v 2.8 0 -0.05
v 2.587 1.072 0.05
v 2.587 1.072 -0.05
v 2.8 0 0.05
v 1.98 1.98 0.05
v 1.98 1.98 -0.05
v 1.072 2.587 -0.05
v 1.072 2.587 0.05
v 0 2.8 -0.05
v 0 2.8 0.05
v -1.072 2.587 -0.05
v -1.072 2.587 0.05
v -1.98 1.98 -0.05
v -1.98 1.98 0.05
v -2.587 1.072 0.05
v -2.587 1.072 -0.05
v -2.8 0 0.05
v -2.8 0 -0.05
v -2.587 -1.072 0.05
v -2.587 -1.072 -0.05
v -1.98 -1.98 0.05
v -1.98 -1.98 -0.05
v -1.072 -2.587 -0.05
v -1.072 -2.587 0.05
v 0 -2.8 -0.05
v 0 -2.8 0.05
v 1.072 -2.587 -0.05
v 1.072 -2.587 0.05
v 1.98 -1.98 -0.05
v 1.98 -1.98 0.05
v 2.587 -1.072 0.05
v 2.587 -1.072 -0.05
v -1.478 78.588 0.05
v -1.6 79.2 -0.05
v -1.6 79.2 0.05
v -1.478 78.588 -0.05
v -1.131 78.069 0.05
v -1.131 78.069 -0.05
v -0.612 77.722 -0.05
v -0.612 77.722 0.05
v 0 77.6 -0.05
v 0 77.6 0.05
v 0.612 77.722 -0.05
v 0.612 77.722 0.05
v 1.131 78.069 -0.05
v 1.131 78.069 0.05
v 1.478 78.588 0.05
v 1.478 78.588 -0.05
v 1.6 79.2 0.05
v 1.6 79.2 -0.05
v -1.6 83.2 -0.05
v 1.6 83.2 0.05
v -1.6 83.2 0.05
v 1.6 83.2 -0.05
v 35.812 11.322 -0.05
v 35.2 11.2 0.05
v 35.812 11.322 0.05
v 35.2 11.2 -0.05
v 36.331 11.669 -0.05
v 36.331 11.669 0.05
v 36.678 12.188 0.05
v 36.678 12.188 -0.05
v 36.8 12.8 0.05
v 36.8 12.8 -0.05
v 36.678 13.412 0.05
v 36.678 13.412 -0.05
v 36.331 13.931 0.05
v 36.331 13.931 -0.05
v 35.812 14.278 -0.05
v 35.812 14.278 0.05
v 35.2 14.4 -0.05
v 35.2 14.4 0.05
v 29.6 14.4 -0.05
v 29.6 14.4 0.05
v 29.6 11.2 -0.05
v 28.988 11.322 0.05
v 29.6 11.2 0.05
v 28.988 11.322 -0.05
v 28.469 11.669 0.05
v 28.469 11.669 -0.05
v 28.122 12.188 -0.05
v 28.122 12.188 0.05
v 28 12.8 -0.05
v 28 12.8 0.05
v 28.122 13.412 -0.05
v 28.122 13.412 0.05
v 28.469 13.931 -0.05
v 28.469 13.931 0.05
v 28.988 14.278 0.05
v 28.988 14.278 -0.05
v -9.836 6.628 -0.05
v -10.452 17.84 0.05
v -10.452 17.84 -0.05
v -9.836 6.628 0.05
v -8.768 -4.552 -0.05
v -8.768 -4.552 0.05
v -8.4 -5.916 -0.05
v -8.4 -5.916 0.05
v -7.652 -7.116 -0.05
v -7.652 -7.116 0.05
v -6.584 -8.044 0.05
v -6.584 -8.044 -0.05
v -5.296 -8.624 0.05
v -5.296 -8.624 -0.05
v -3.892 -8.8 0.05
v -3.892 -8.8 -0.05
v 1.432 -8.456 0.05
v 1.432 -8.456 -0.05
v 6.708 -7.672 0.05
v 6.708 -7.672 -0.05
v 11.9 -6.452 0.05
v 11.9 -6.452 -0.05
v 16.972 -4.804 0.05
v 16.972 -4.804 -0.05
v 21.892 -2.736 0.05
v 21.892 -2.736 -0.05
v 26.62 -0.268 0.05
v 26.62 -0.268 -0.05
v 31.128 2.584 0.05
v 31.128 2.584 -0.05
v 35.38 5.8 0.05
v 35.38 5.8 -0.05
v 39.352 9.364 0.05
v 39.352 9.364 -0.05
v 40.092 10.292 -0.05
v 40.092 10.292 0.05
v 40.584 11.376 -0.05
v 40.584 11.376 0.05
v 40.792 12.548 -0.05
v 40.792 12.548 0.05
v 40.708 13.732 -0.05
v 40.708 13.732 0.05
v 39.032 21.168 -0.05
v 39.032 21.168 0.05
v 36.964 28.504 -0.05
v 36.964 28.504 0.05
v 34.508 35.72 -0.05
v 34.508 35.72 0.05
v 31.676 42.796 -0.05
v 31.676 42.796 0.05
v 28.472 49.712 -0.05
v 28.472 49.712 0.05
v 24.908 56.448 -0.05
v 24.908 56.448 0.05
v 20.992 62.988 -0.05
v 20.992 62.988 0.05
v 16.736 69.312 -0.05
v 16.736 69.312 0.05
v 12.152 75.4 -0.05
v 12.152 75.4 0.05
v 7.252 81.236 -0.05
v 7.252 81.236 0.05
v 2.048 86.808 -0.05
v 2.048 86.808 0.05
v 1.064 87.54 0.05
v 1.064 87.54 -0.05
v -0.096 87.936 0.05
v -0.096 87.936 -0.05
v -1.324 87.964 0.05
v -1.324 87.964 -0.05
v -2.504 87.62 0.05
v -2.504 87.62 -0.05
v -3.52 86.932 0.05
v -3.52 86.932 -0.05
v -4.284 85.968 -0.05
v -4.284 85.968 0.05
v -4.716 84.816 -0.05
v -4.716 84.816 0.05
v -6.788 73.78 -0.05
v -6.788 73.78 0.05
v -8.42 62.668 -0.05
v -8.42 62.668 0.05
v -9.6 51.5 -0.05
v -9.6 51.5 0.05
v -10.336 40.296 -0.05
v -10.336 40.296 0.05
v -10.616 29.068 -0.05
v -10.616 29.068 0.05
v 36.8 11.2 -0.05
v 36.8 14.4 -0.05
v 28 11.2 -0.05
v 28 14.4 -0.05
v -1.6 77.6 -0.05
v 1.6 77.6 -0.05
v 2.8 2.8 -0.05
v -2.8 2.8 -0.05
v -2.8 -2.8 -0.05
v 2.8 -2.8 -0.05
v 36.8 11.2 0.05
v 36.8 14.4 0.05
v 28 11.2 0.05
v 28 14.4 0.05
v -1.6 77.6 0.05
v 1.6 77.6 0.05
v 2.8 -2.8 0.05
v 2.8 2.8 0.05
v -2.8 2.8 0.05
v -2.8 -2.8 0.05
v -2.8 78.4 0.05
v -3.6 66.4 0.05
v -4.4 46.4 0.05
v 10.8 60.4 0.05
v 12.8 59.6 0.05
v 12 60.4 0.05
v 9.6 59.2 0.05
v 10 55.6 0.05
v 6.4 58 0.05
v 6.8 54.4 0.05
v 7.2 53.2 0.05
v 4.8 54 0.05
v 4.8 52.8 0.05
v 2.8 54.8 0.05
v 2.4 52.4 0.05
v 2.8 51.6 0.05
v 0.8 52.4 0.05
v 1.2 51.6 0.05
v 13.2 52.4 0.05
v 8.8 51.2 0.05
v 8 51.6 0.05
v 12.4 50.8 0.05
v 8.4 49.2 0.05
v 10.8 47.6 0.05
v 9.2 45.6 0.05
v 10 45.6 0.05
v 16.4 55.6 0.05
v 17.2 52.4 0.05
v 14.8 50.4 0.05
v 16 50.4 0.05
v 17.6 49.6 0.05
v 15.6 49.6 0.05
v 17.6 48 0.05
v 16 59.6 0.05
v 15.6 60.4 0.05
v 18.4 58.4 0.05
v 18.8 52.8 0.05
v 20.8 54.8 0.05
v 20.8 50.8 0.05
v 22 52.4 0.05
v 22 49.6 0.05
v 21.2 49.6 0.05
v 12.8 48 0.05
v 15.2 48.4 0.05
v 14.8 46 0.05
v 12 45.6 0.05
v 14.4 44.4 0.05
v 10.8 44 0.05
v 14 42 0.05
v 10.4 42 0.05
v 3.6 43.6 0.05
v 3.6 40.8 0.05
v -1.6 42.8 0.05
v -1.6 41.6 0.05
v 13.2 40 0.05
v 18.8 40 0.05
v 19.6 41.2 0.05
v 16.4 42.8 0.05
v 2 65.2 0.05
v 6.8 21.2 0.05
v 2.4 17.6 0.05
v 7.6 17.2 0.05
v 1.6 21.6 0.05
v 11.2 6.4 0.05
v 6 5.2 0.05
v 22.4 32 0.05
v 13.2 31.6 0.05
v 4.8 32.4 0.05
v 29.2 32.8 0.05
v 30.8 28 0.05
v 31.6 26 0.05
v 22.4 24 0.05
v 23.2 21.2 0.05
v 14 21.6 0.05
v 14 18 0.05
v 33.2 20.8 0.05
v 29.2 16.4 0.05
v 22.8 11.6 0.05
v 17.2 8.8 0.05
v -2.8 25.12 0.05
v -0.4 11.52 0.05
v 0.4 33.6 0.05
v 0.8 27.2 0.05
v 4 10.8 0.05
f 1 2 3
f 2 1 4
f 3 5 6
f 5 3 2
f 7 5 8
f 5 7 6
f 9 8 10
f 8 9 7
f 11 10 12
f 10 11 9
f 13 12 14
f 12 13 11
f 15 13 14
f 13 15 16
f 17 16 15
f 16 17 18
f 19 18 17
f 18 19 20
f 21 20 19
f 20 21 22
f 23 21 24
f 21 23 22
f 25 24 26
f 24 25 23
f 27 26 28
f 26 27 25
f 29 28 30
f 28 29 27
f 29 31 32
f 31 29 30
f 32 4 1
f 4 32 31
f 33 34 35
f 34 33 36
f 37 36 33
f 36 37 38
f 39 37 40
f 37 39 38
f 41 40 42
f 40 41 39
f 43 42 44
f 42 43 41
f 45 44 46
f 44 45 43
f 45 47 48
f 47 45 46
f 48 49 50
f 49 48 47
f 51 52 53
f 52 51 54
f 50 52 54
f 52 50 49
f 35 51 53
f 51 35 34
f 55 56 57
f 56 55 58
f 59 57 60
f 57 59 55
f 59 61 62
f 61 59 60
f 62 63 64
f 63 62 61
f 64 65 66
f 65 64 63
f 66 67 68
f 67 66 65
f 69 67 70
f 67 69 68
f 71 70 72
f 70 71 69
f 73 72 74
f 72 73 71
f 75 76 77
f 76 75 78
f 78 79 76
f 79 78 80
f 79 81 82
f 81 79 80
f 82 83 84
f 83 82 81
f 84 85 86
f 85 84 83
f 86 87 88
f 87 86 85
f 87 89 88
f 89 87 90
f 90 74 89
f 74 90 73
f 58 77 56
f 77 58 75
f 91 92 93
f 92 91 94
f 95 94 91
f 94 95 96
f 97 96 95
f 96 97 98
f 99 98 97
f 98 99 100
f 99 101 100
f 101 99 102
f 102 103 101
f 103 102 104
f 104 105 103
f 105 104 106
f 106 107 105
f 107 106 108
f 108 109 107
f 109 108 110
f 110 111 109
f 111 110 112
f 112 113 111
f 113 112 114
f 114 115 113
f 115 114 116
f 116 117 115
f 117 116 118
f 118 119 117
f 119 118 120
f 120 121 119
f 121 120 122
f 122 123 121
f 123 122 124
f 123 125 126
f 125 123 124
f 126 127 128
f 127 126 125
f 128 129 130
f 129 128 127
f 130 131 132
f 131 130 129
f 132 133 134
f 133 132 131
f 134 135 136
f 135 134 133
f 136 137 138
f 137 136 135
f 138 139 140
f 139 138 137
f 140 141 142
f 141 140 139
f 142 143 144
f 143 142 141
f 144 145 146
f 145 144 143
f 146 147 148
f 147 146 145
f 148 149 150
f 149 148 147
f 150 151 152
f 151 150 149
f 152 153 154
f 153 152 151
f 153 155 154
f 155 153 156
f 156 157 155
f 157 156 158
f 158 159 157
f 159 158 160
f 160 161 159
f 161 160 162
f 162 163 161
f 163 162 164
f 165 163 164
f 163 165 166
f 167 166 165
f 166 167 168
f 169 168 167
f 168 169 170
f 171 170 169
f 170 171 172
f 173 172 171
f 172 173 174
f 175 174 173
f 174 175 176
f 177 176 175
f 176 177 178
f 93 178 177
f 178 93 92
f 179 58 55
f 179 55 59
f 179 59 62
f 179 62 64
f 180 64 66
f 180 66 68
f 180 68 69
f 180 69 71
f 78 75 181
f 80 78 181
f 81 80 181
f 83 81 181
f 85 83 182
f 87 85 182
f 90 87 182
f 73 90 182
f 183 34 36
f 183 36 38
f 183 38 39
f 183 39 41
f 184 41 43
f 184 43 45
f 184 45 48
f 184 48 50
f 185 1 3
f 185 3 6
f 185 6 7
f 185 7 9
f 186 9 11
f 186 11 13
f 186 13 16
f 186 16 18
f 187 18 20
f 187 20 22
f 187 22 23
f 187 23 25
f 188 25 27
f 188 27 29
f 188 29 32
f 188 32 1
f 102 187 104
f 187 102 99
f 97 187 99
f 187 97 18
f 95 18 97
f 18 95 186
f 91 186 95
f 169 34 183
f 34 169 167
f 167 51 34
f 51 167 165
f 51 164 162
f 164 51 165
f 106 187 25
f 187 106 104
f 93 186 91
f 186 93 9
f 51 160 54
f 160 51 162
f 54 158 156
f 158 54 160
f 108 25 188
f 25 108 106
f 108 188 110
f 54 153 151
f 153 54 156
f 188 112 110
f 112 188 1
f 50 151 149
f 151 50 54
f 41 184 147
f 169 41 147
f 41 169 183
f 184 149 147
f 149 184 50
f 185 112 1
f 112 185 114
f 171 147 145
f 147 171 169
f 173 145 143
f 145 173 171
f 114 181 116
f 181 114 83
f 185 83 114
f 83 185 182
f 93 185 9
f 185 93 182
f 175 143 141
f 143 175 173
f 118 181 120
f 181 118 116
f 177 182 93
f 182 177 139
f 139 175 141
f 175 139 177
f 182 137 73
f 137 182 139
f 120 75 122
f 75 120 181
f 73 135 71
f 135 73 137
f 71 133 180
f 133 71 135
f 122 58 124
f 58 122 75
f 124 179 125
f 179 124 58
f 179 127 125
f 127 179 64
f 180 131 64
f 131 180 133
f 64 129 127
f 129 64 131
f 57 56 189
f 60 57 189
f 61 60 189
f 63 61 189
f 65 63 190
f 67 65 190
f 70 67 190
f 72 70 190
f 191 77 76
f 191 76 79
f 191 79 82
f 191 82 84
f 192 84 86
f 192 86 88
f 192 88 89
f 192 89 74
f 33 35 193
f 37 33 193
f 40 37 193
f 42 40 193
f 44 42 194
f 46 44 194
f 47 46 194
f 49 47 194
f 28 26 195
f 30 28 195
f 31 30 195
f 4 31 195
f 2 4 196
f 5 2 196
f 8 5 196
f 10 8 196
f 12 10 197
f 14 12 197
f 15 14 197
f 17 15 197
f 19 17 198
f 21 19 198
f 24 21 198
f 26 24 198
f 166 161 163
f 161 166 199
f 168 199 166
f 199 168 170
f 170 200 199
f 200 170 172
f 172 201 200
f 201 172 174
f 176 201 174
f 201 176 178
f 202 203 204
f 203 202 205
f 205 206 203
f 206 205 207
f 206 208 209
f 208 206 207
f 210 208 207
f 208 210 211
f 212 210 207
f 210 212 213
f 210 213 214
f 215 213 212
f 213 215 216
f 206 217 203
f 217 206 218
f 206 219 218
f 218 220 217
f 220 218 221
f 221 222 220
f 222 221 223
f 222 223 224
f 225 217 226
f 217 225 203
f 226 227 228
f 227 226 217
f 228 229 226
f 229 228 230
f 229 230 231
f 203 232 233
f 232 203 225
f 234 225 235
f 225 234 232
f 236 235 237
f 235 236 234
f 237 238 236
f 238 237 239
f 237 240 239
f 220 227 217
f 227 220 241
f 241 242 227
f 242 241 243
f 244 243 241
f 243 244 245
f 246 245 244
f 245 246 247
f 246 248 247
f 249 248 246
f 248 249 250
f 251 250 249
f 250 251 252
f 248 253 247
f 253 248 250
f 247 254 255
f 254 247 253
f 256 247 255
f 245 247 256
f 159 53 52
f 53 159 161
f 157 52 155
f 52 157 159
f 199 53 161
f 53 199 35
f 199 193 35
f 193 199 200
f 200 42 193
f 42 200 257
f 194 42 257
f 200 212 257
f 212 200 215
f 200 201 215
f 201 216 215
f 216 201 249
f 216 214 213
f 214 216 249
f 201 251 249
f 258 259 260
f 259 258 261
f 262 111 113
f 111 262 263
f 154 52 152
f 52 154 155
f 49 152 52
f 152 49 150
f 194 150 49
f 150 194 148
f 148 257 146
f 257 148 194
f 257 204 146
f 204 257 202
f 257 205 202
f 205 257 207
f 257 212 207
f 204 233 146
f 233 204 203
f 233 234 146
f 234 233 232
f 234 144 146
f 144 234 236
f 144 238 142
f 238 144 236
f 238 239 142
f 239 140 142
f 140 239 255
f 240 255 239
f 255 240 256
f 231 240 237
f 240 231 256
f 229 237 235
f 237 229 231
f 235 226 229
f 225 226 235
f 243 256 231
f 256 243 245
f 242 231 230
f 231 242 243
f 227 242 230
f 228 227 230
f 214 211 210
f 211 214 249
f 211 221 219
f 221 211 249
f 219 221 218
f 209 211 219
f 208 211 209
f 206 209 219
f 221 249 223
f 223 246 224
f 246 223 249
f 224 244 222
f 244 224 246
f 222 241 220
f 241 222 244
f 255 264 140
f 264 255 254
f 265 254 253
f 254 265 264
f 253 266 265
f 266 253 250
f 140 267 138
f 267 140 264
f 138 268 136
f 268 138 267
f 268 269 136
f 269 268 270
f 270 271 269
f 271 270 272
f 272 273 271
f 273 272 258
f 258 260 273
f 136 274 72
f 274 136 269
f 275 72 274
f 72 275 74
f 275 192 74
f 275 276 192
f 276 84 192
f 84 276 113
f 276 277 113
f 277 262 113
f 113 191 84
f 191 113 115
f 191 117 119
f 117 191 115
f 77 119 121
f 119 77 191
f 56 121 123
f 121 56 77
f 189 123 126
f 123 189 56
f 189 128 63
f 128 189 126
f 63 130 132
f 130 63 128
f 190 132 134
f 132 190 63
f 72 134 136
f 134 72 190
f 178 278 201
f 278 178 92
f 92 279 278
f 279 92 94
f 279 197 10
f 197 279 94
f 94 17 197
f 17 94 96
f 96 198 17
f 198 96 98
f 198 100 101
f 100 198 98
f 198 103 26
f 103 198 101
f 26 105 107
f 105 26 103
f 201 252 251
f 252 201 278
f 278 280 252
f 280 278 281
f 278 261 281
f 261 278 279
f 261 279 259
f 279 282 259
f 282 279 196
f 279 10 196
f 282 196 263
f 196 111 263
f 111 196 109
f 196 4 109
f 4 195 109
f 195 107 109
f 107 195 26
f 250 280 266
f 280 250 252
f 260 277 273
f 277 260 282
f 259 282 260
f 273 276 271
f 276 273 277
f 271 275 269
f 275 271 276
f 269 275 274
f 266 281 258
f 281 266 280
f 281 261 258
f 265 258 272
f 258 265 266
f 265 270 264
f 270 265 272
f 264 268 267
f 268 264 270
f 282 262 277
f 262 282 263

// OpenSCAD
use <../lib.scad>
use <../p/2-4ndis.scad>
use <../p/4-4ndis.scad>
use <s/u66s01.scad>
use <s/u66s02.scad>
function ldraw_lib__u66p03() = [
// 0 Sheet Plastic  6 x 12 Triangular with Palm Tree and Vertical Pink Gradient Stripes Pattern
// 0 Name: u66p03.dat
// 0 Author: Takeshi Takahashi [RainbowDolphin]
// 0 !LDRAW_ORG Part UPDATE 2024-04
// 0 !LICENSE Licensed under CC BY 4.0 : see CAreadme.txt
// 
// 0 BFC CERTIFY CCW
  [0,"BFC","CERTIFY"],
  [0,"BFC","CCW"],
// 
// 0 !CATEGORY Sheet Plastic
// 0 !KEYWORDS Bricklink x66px9, Paradisa, Rebrickable upn0306pr0008, Sail
// 0 !KEYWORDS Set 6401, Set 6410, Set 6411, Surfboard
// 
// 0 !HISTORY 2023-01-09 [tchang] Replace CLIP` by CLIP on line 149
// 0 !HISTORY 2024-05-28 [OrionP] Official Update 2024-04
// 
// 
// 1 16 0 0 0 1 0 0 0 1 0 0 0 1 s\u66s01.dat
  [1,16,0,0,0,1,0,0,0,1,0,0,0,1, ldraw_lib__s__u66s01()],
// 1 16 0 .125 0 1 0 0 0 -1 0 0 0 1 s\u66s02.dat
  [1,16,0,.125,0,1,0,0,0,-1,0,0,0,1, ldraw_lib__s__u66s02()],
// 
// 0 // Pattern
// 0 BFC NOCLIP
  [0,"BFC","NOCLIP"],
// 1 13 88 -.125 32 0 0 4 0 1 0 -4 0 0 2-4ndis.dat
  [1,13,88,-.125,32,0,0,4,0,1,0,-4,0,0, ldraw_lib__2_4ndis()],
// 1 13 74 -.125 32 0 0 -4 0 1 0 -4 0 0 2-4ndis.dat
  [1,13,74,-.125,32,0,0,-4,0,1,0,-4,0,0, ldraw_lib__2_4ndis()],
// 1 351 0 -.125 198 -4 0 0 0 1 0 0 0 -4 2-4ndis.dat
  [1,351,0,-.125,198,-4,0,0,0,1,0,0,0,-4, ldraw_lib__2_4ndis()],
// 1 5 0 -.125 0 0 0 7 0 1 0 -7 0 0 4-4ndis.dat
  [1,5,0,-.125,0,0,0,7,0,1,0,-7,0,0, ldraw_lib__4_4ndis()],
// 4 5 -7 -.125 196 -6.26 -.125 219.05 -8.8 -.125 217.33 -10.71 -.125 214.92
  [4,5,-7,-.125,196,-6.26,-.125,219.05,-8.8,-.125,217.33,-10.71,-.125,214.92],
// 4 5 -7 -.125 196 -10.71 -.125 214.92 -11.79 -.125 212.04 -16.97 -.125 184.45
  [4,5,-7,-.125,196,-10.71,-.125,214.92,-11.79,-.125,212.04,-16.97,-.125,184.45],
// 4 5 -9 -.125 166 -7 -.125 196 -16.97 -.125 184.45 -21.05 -.125 156.67
  [4,5,-9,-.125,166,-7,-.125,196,-16.97,-.125,184.45,-21.05,-.125,156.67],
// 4 5 -9 -.125 166 -21.05 -.125 156.67 -24 -.125 128.75 -11 -.125 116
  [4,5,-9,-.125,166,-21.05,-.125,156.67,-24,-.125,128.75,-11,-.125,116],
// 4 5 -11 -.125 116 -24 -.125 128.75 -25.84 -.125 100.74 -26.54 -.125 72.67
  [4,5,-11,-.125,116,-24,-.125,128.75,-25.84,-.125,100.74,-26.54,-.125,72.67],
// 4 2 32 -.125 149 30 -.125 151 27 -.125 151 24 -.125 148
  [4,2,32,-.125,149,30,-.125,151,27,-.125,151,24,-.125,148],
// 4 2 25 -.125 139 32 -.125 149 24 -.125 148 16 -.125 145
  [4,2,25,-.125,139,32,-.125,149,24,-.125,148,16,-.125,145],
// 4 2 25 -.125 139 16 -.125 145 17 -.125 136 18 -.125 133
  [4,2,25,-.125,139,16,-.125,145,17,-.125,136,18,-.125,133],
// 4 2 17 -.125 136 16 -.125 145 12 -.125 135 12 -.125 132
  [4,2,17,-.125,136,16,-.125,145,12,-.125,135,12,-.125,132],
// 4 2 12 -.125 135 16 -.125 145 7 -.125 137 6 -.125 131
  [4,2,12,-.125,135,16,-.125,145,7,-.125,137,6,-.125,131],
// 3 2 12 -.125 135 6 -.125 131 7 -.125 129
  [3,2,12,-.125,135,6,-.125,131,7,-.125,129],
// 4 2 6 -.125 131 7 -.125 137 2 -.125 131 3 -.125 129
  [4,2,6,-.125,131,7,-.125,137,2,-.125,131,3,-.125,129],
// 4 2 33 -.125 131 32 -.125 149 25 -.125 139 22 -.125 128
  [4,2,33,-.125,131,32,-.125,149,25,-.125,139,22,-.125,128],
// 3 2 25 -.125 139 20 -.125 129 22 -.125 128
  [3,2,25,-.125,139,20,-.125,129,22,-.125,128],
// 4 2 31 -.125 127 33 -.125 131 22 -.125 128 21 -.125 123
  [4,2,31,-.125,127,33,-.125,131,22,-.125,128,21,-.125,123],
// 4 2 27 -.125 119 31 -.125 127 21 -.125 123 23 -.125 114
  [4,2,27,-.125,119,31,-.125,127,21,-.125,123,23,-.125,114],
// 3 2 27 -.125 119 23 -.125 114 25 -.125 114
  [3,2,27,-.125,119,23,-.125,114,25,-.125,114],
// 4 2 41 -.125 139 32 -.125 149 33 -.125 131 43 -.125 131
  [4,2,41,-.125,139,32,-.125,149,33,-.125,131,43,-.125,131],
// 4 2 43 -.125 131 33 -.125 131 37 -.125 126 40 -.125 126
  [4,2,43,-.125,131,33,-.125,131,37,-.125,126,40,-.125,126],
// 4 2 44 -.125 124 43 -.125 131 40 -.125 126 39 -.125 124
  [4,2,44,-.125,124,43,-.125,131,40,-.125,126,39,-.125,124],
// 3 2 44 -.125 124 39 -.125 124 44 -.125 120
  [3,2,44,-.125,124,39,-.125,124,44,-.125,120],
// 4 2 32 -.125 149 41 -.125 139 40 -.125 149 39 -.125 151
  [4,2,32,-.125,149,41,-.125,139,40,-.125,149,39,-.125,151],
// 4 2 46 -.125 146 40 -.125 149 41 -.125 139 47 -.125 132
  [4,2,46,-.125,146,40,-.125,149,41,-.125,139,47,-.125,132],
// 4 2 52 -.125 137 46 -.125 146 47 -.125 132 52 -.125 127
  [4,2,52,-.125,137,46,-.125,146,47,-.125,132,52,-.125,127],
// 4 2 55 -.125 131 52 -.125 137 52 -.125 127 55 -.125 124
  [4,2,55,-.125,131,52,-.125,137,52,-.125,127,55,-.125,124],
// 3 2 52 -.125 127 53 -.125 124 55 -.125 124
  [3,2,52,-.125,127,53,-.125,124,55,-.125,124],
// 4 6 37 -.125 126 33 -.125 131 31 -.125 127 32 -.125 120
  [4,6,37,-.125,126,33,-.125,131,31,-.125,127,32,-.125,120],
// 4 6 38 -.125 121 37 -.125 126 32 -.125 120 37 -.125 115
  [4,6,38,-.125,121,37,-.125,126,32,-.125,120,37,-.125,115],
// 4 6 37 -.125 115 32 -.125 120 30 -.125 114 36 -.125 111
  [4,6,37,-.125,115,32,-.125,120,30,-.125,114,36,-.125,111],
// 4 6 36 -.125 111 30 -.125 114 27 -.125 110 35 -.125 105
  [4,6,36,-.125,111,30,-.125,114,27,-.125,110,35,-.125,105],
// 3 6 27 -.125 110 26 -.125 105 35 -.125 105
  [3,6,27,-.125,110,26,-.125,105,35,-.125,105],
// 4 14 26 -.125 105 27 -.125 110 9 -.125 109 9 -.125 102
  [4,14,26,-.125,105,27,-.125,110,9,-.125,109,9,-.125,102],
// 4 14 9 -.125 102 9 -.125 109 -4 -.125 107 -4 -.125 104
  [4,14,9,-.125,102,9,-.125,109,-4,-.125,107,-4,-.125,104],
// 4 14 26 -.125 105 9 -.125 102 33 -.125 100 35 -.125 105
  [4,14,26,-.125,105,9,-.125,102,33,-.125,100,35,-.125,105],
// 4 14 35 -.125 105 33 -.125 100 47 -.125 100 49 -.125 103
  [4,14,35,-.125,105,33,-.125,100,47,-.125,100,49,-.125,103],
// 3 14 41 -.125 107 35 -.125 105 49 -.125 103
  [3,14,41,-.125,107,35,-.125,105,49,-.125,103],
// 3 14 36 -.125 111 35 -.125 105 41 -.125 107
  [3,14,36,-.125,111,35,-.125,105,41,-.125,107],
// 4 351 -3.31 -.125 219.91 -6.26 -.125 219.05 -4 -.125 208 4 -.125 208
  [4,351,-3.31,-.125,219.91,-6.26,-.125,219.05,-4,-.125,208,4,-.125,208],
// 4 351 -.24 -.125 219.84 -3.31 -.125 219.91 4 -.125 208 2.66 -.125 218.85
  [4,351,-.24,-.125,219.84,-3.31,-.125,219.91,4,-.125,208,2.66,-.125,218.85],
// 4 351 -4 -.125 208 -6.26 -.125 219.05 -7 -.125 196 -4 -.125 198
  [4,351,-4,-.125,208,-6.26,-.125,219.05,-7,-.125,196,-4,-.125,198],
// 4 351 -4 -.125 194 -4 -.125 198 -7 -.125 196 -9 -.125 166
  [4,351,-4,-.125,194,-4,-.125,198,-7,-.125,196,-9,-.125,166],
// 4 351 -4 -.125 194 -9 -.125 166 5 -.125 163 0 -.125 194
  [4,351,-4,-.125,194,-9,-.125,166,5,-.125,163,0,-.125,194],
// 3 351 4 -.125 194 0 -.125 194 5 -.125 163
  [3,351,4,-.125,194,0,-.125,194,5,-.125,163],
// 4 351 7 -.125 137 5 -.125 163 -9 -.125 166 2 -.125 131
  [4,351,7,-.125,137,5,-.125,163,-9,-.125,166,2,-.125,131],
// 3 351 -9 -.125 166 -11 -.125 116 2 -.125 131
  [3,351,-9,-.125,166,-11,-.125,116,2,-.125,131],
// 4 351 3 -.125 129 2 -.125 131 -11 -.125 116 9 -.125 109
  [4,351,3,-.125,129,2,-.125,131,-11,-.125,116,9,-.125,109],
// 4 351 3 -.125 129 9 -.125 109 7 -.125 129 6 -.125 131
  [4,351,3,-.125,129,9,-.125,109,7,-.125,129,6,-.125,131],
// 3 351 -11 -.125 116 -4 -.125 107 9 -.125 109
  [3,351,-11,-.125,116,-4,-.125,107,9,-.125,109],
// 4 351 17 -.125 53 4 -.125 54 6 -.125 44 19 -.125 43
  [4,351,17,-.125,53,4,-.125,54,6,-.125,44,19,-.125,43],
// 4 351 28 -.125 16 15 -.125 13 29.75 -.125 -16.13 42.43 -.125 -12.01
  [4,351,28,-.125,16,15,-.125,13,29.75,-.125,-16.13,42.43,-.125,-12.01],
// 4 13 5.12 -.125 217.02 2.66 -.125 218.85 4 -.125 208 18.13 -.125 203.09
  [4,13,5.12,-.125,217.02,2.66,-.125,218.85,4,-.125,208,18.13,-.125,203.09],
// 4 13 18.13 -.125 203.09 4 -.125 208 4 -.125 198 30.38 -.125 188.5
  [4,13,18.13,-.125,203.09,4,-.125,208,4,-.125,198,30.38,-.125,188.5],
// 4 13 30.38 -.125 188.5 4 -.125 198 4 -.125 194 41.84 -.125 173.28
  [4,13,30.38,-.125,188.5,4,-.125,198,4,-.125,194,41.84,-.125,173.28],
// 4 13 41.84 -.125 173.28 4 -.125 194 5 -.125 163 52.48 -.125 157.47
  [4,13,41.84,-.125,173.28,4,-.125,194,5,-.125,163,52.48,-.125,157.47],
// 4 13 30 -.125 151 52.48 -.125 157.47 5 -.125 163 27 -.125 151
  [4,13,30,-.125,151,52.48,-.125,157.47,5,-.125,163,27,-.125,151],
// 4 13 24 -.125 148 27 -.125 151 5 -.125 163 16 -.125 145
  [4,13,24,-.125,148,27,-.125,151,5,-.125,163,16,-.125,145],
// 3 13 5 -.125 163 7 -.125 137 16 -.125 145
  [3,13,5,-.125,163,7,-.125,137,16,-.125,145],
// 4 13 39 -.125 151 52.48 -.125 157.47 30 -.125 151 32 -.125 149
  [4,13,39,-.125,151,52.48,-.125,157.47,30,-.125,151,32,-.125,149],
// 4 13 52.48 -.125 157.47 39 -.125 151 40 -.125 149 46 -.125 146
  [4,13,52.48,-.125,157.47,39,-.125,151,40,-.125,149,46,-.125,146],
// 4 13 62.27 -.125 141.12 52.48 -.125 157.47 46 -.125 146 52 -.125 137
  [4,13,62.27,-.125,141.12,52.48,-.125,157.47,46,-.125,146,52,-.125,137],
// 4 13 62.27 -.125 141.12 52 -.125 137 55 -.125 131 71.18 -.125 124.28
  [4,13,62.27,-.125,141.12,52,-.125,137,55,-.125,131,71.18,-.125,124.28],
// 3 13 55 -.125 131 55 -.125 124 71.18 -.125 124.28
  [3,13,55,-.125,131,55,-.125,124,71.18,-.125,124.28],
// 4 13 71.18 -.125 124.28 55 -.125 124 49 -.125 103 79.19 -.125 106.99
  [4,13,71.18,-.125,124.28,55,-.125,124,49,-.125,103,79.19,-.125,106.99],
// 4 13 49 -.125 103 55 -.125 124 53 -.125 124 41 -.125 107
  [4,13,49,-.125,103,55,-.125,124,53,-.125,124,41,-.125,107],
// 4 13 44 -.125 120 41 -.125 107 53 -.125 124 52 -.125 127
  [4,13,44,-.125,120,41,-.125,107,53,-.125,124,52,-.125,127],
// 4 13 44 -.125 124 44 -.125 120 52 -.125 127 47 -.125 132
  [4,13,44,-.125,124,44,-.125,120,52,-.125,127,47,-.125,132],
// 3 13 47 -.125 132 43 -.125 131 44 -.125 124
  [3,13,47,-.125,132,43,-.125,131,44,-.125,124],
// 3 13 41 -.125 139 43 -.125 131 47 -.125 132
  [3,13,41,-.125,139,43,-.125,131,47,-.125,132],
// 4 13 37 -.125 115 36 -.125 111 41 -.125 107 44 -.125 120
  [4,13,37,-.125,115,36,-.125,111,41,-.125,107,44,-.125,120],
// 4 13 38 -.125 121 37 -.125 115 44 -.125 120 39 -.125 124
  [4,13,38,-.125,121,37,-.125,115,44,-.125,120,39,-.125,124],
// 3 13 37 -.125 126 38 -.125 121 39 -.125 124
  [3,13,37,-.125,126,38,-.125,121,39,-.125,124],
// 3 13 40 -.125 126 37 -.125 126 39 -.125 124
  [3,13,40,-.125,126,37,-.125,126,39,-.125,124],
// 4 13 12 -.125 132 12 -.125 135 7 -.125 129 9 -.125 109
  [4,13,12,-.125,132,12,-.125,135,7,-.125,129,9,-.125,109],
// 4 13 12 -.125 132 9 -.125 109 21 -.125 123 20 -.125 129
  [4,13,12,-.125,132,9,-.125,109,21,-.125,123,20,-.125,129],
// 3 13 20 -.125 129 21 -.125 123 22 -.125 128
  [3,13,20,-.125,129,21,-.125,123,22,-.125,128],
// 3 13 18 -.125 133 12 -.125 132 20 -.125 129
  [3,13,18,-.125,133,12,-.125,132,20,-.125,129],
// 3 13 17 -.125 136 12 -.125 132 18 -.125 133
  [3,13,17,-.125,136,12,-.125,132,18,-.125,133],
// 3 13 25 -.125 139 18 -.125 133 20 -.125 129
  [3,13,25,-.125,139,18,-.125,133,20,-.125,129],
// 3 13 21 -.125 123 9 -.125 109 23 -.125 114
  [3,13,21,-.125,123,9,-.125,109,23,-.125,114],
// 4 13 23 -.125 114 9 -.125 109 27 -.125 110 25 -.125 114
  [4,13,23,-.125,114,9,-.125,109,27,-.125,110,25,-.125,114],
// 4 13 25 -.125 114 27 -.125 110 30 -.125 114 27 -.125 119
  [4,13,25,-.125,114,27,-.125,110,30,-.125,114,27,-.125,119],
// 4 13 27 -.125 119 30 -.125 114 32 -.125 120 31 -.125 127
  [4,13,27,-.125,119,30,-.125,114,32,-.125,120,31,-.125,127],
// 4 13 79.19 -.125 106.99 49 -.125 103 47 -.125 100 56 -.125 80
  [4,13,79.19,-.125,106.99,49,-.125,103,47,-.125,100,56,-.125,80],
// 4 13 33 -.125 79 56 -.125 80 47 -.125 100 33 -.125 100
  [4,13,33,-.125,79,56,-.125,80,47,-.125,100,33,-.125,100],
// 4 13 12 -.125 81 33 -.125 79 33 -.125 100 9 -.125 102
  [4,13,12,-.125,81,33,-.125,79,33,-.125,100,9,-.125,102],
// 4 13 79.19 -.125 106.99 56 -.125 80 73 -.125 82 86.27 -.125 89.3
  [4,13,79.19,-.125,106.99,56,-.125,80,73,-.125,82,86.27,-.125,89.3],
// 4 13 86.27 -.125 89.3 73 -.125 82 77 -.125 70 92.41 -.125 71.26
  [4,13,86.27,-.125,89.3,73,-.125,82,77,-.125,70,92.41,-.125,71.26],
// 4 13 79 -.125 65 92.41 -.125 71.26 77 -.125 70 56 -.125 60
  [4,13,79,-.125,65,92.41,-.125,71.26,77,-.125,70,56,-.125,60],
// 4 13 58 -.125 53 79 -.125 65 56 -.125 60 35 -.125 54
  [4,13,58,-.125,53,79,-.125,65,56,-.125,60,35,-.125,54],
// 4 13 35 -.125 45 58 -.125 53 35 -.125 54 17 -.125 53
  [4,13,35,-.125,45,58,-.125,53,35,-.125,54,17,-.125,53],
// 3 13 17 -.125 53 19 -.125 43 35 -.125 45
  [3,13,17,-.125,53,19,-.125,43,35,-.125,45],
// 4 13 92.41 -.125 71.26 79 -.125 65 83 -.125 52 88 -.125 36
  [4,13,92.41,-.125,71.26,79,-.125,65,83,-.125,52,88,-.125,36],
// 4 13 74 -.125 36 88 -.125 36 83 -.125 52 73 -.125 41
  [4,13,74,-.125,36,88,-.125,36,83,-.125,52,73,-.125,41],
// 3 13 73 -.125 41 70 -.125 36 74 -.125 36
  [3,13,73,-.125,41,70,-.125,36,74,-.125,36],
// 3 13 73 -.125 41 57 -.125 29 70 -.125 36
  [3,13,73,-.125,41,57,-.125,29,70,-.125,36],
// 4 13 70 -.125 32 70 -.125 36 57 -.125 29 42.43 -.125 -12.01
  [4,13,70,-.125,32,70,-.125,36,57,-.125,29,42.43,-.125,-12.01],
// 3 13 57 -.125 29 43 -.125 22 42.43 -.125 -12.01
  [3,13,57,-.125,29,43,-.125,22,42.43,-.125,-12.01],
// 3 13 43 -.125 22 28 -.125 16 42.43 -.125 -12.01
  [3,13,43,-.125,22,28,-.125,16,42.43,-.125,-12.01],
// 4 13 70 -.125 28 70 -.125 32 42.43 -.125 -12.01 54.73 -.125 -6.84
  [4,13,70,-.125,28,70,-.125,32,42.43,-.125,-12.01,54.73,-.125,-6.84],
// 4 13 70 -.125 28 54.73 -.125 -6.84 66.55 -.125 -.67 77.82 -.125 6.46
  [4,13,70,-.125,28,54.73,-.125,-6.84,66.55,-.125,-.67,77.82,-.125,6.46],
// 4 13 74 -.125 28 70 -.125 28 77.82 -.125 6.46 88.45 -.125 14.5
  [4,13,74,-.125,28,70,-.125,28,77.82,-.125,6.46,88.45,-.125,14.5],
// 4 13 88 -.125 28 74 -.125 28 88.45 -.125 14.5 98.38 -.125 23.41
  [4,13,88,-.125,28,74,-.125,28,88.45,-.125,14.5,98.38,-.125,23.41],
// 4 13 92 -.125 28 88 -.125 28 98.38 -.125 23.41 100.23 -.125 25.73
  [4,13,92,-.125,28,88,-.125,28,98.38,-.125,23.41,100.23,-.125,25.73],
// 4 13 92 -.125 32 92 -.125 28 100.23 -.125 25.73 101.46 -.125 28.44
  [4,13,92,-.125,32,92,-.125,28,100.23,-.125,25.73,101.46,-.125,28.44],
// 4 13 92 -.125 32 101.46 -.125 28.44 101.98 -.125 31.37 101.77 -.125 34.33
  [4,13,92,-.125,32,101.46,-.125,28.44,101.98,-.125,31.37,101.77,-.125,34.33],
// 4 13 92 -.125 36 92 -.125 32 101.77 -.125 34.33 97.58 -.125 52.92
  [4,13,92,-.125,36,92,-.125,32,101.77,-.125,34.33,97.58,-.125,52.92],
// 4 13 92 -.125 36 97.58 -.125 52.92 92.41 -.125 71.26 88 -.125 36
  [4,13,92,-.125,36,97.58,-.125,52.92,92.41,-.125,71.26,88,-.125,36],
// 4 5 -7 -.125 62.8 -11 -.125 116 -26.54 -.125 72.67 -26.13 -.125 44.6
  [4,5,-7,-.125,62.8,-11,-.125,116,-26.54,-.125,72.67,-26.13,-.125,44.6],
// 4 5 -1 -.125 28.8 -7 -.125 62.8 -26.13 -.125 44.6 -24.59 -.125 16.57
  [4,5,-1,-.125,28.8,-7,-.125,62.8,-26.13,-.125,44.6,-24.59,-.125,16.57],
// 4 5 -1 -.125 28.8 -24.59 -.125 16.57 -7 -.125 7 0 -.125 7
  [4,5,-1,-.125,28.8,-24.59,-.125,16.57,-7,-.125,7,0,-.125,7],
// 4 5 -7 -.125 7 -24.59 -.125 16.57 -21.92 -.125 -11.38 -7 -.125 0
  [4,5,-7,-.125,7,-24.59,-.125,16.57,-21.92,-.125,-11.38,-7,-.125,0],
// 4 5 -7 -.125 0 -21.92 -.125 -11.38 -21 -.125 -14.79 -7 -.125 -7
  [4,5,-7,-.125,0,-21.92,-.125,-11.38,-21,-.125,-14.79,-7,-.125,-7],
// 4 5 -7 -.125 -7 -21 -.125 -14.79 -19.13 -.125 -17.79 -16.46 -.125 -20.11
  [4,5,-7,-.125,-7,-21,-.125,-14.79,-19.13,-.125,-17.79,-16.46,-.125,-20.11],
// 4 5 -7 -.125 -7 -16.46 -.125 -20.11 -13.24 -.125 -21.56 0 -.125 -7
  [4,5,-7,-.125,-7,-16.46,-.125,-20.11,-13.24,-.125,-21.56,0,-.125,-7],
// 4 5 0 -.125 -7 -13.24 -.125 -21.56 -9.73 -.125 -22 3.58 -.125 -21.14
  [4,5,0,-.125,-7,-13.24,-.125,-21.56,-9.73,-.125,-22,3.58,-.125,-21.14],
// 4 351 -4 -.125 104 -4 -.125 107 -11 -.125 116 -7 -.125 62.8
  [4,351,-4,-.125,104,-4,-.125,107,-11,-.125,116,-7,-.125,62.8],
// 4 351 1 -.125 84 -4 -.125 104 -7 -.125 62.8 2 -.125 68
  [4,351,1,-.125,84,-4,-.125,104,-7,-.125,62.8,2,-.125,68],
// 4 351 4 -.125 54 2 -.125 68 -7 -.125 62.8 -1 -.125 28.8
  [4,351,4,-.125,54,2,-.125,68,-7,-.125,62.8,-1,-.125,28.8],
// 3 351 4 -.125 54 -1 -.125 28.8 6 -.125 44
  [3,351,4,-.125,54,-1,-.125,28.8,6,-.125,44],
// 4 351 10 -.125 27 6 -.125 44 -1 -.125 28.8 7 -.125 7
  [4,351,10,-.125,27,6,-.125,44,-1,-.125,28.8,7,-.125,7],
// 3 5 -1 -.125 28.8 0 -.125 7 7 -.125 7
  [3,5,-1,-.125,28.8,0,-.125,7,7,-.125,7],
// 3 351 10 -.125 27 7 -.125 7 15 -.125 13
  [3,351,10,-.125,27,7,-.125,7,15,-.125,13],
// 4 351 29.75 -.125 -16.13 15 -.125 13 7 -.125 7 16.77 -.125 -19.18
  [4,351,29.75,-.125,-16.13,15,-.125,13,7,-.125,7,16.77,-.125,-19.18],
// 3 5 7 -.125 7 7 -.125 0 16.77 -.125 -19.18
  [3,5,7,-.125,7,7,-.125,0,16.77,-.125,-19.18],
// 3 5 7 -.125 0 7 -.125 -7 16.77 -.125 -19.18
  [3,5,7,-.125,0,7,-.125,-7,16.77,-.125,-19.18],
// 4 5 3.58 -.125 -21.14 16.77 -.125 -19.18 7 -.125 -7 0 -.125 -7
  [4,5,3.58,-.125,-21.14,16.77,-.125,-19.18,7,-.125,-7,0,-.125,-7],
// 4 351 9 -.125 102 -4 -.125 104 1 -.125 84 12 -.125 81
  [4,351,9,-.125,102,-4,-.125,104,1,-.125,84,12,-.125,81],
// 0 BFC CLIP
  [0,"BFC","CLIP"],
// 4 16 10 -.125 27 43 -.125 22 35 -.125 45 19 -.125 43
  [4,16,10,-.125,27,43,-.125,22,35,-.125,45,19,-.125,43],
// 3 16 6 -.125 44 10 -.125 27 19 -.125 43
  [3,16,6,-.125,44,10,-.125,27,19,-.125,43],
// 4 16 35 -.125 45 43 -.125 22 57 -.125 29 58 -.125 53
  [4,16,35,-.125,45,43,-.125,22,57,-.125,29,58,-.125,53],
// 4 16 58 -.125 53 57 -.125 29 73 -.125 41 79 -.125 65
  [4,16,58,-.125,53,57,-.125,29,73,-.125,41,79,-.125,65],
// 3 16 79 -.125 65 73 -.125 41 83 -.125 52
  [3,16,79,-.125,65,73,-.125,41,83,-.125,52],
// 4 16 12 -.125 81 1 -.125 84 2 -.125 68 17 -.125 53
  [4,16,12,-.125,81,1,-.125,84,2,-.125,68,17,-.125,53],
// 3 16 2 -.125 68 4 -.125 54 17 -.125 53
  [3,16,2,-.125,68,4,-.125,54,17,-.125,53],
// 4 16 12 -.125 81 17 -.125 53 35 -.125 54 33 -.125 79
  [4,16,12,-.125,81,17,-.125,53,35,-.125,54,33,-.125,79],
// 4 16 33 -.125 79 35 -.125 54 56 -.125 60 56 -.125 80
  [4,16,33,-.125,79,35,-.125,54,56,-.125,60,56,-.125,80],
// 4 16 56 -.125 80 56 -.125 60 77 -.125 70 73 -.125 82
  [4,16,56,-.125,80,56,-.125,60,77,-.125,70,73,-.125,82],
// 4 16 10 -.125 27 15 -.125 13 28 -.125 16 43 -.125 22
  [4,16,10,-.125,27,15,-.125,13,28,-.125,16,43,-.125,22],
];
module ldraw_lib__u66p03(step=0, col=false, unit=2/5, alt=false, line=0.2, solid=!$preview)
    makepoly(ldraw_lib__u66p03(), step=step, col=col, unit=unit, alt=alt, line=line, solid=solid);
ldraw_lib__u66p03(line=0.2);
